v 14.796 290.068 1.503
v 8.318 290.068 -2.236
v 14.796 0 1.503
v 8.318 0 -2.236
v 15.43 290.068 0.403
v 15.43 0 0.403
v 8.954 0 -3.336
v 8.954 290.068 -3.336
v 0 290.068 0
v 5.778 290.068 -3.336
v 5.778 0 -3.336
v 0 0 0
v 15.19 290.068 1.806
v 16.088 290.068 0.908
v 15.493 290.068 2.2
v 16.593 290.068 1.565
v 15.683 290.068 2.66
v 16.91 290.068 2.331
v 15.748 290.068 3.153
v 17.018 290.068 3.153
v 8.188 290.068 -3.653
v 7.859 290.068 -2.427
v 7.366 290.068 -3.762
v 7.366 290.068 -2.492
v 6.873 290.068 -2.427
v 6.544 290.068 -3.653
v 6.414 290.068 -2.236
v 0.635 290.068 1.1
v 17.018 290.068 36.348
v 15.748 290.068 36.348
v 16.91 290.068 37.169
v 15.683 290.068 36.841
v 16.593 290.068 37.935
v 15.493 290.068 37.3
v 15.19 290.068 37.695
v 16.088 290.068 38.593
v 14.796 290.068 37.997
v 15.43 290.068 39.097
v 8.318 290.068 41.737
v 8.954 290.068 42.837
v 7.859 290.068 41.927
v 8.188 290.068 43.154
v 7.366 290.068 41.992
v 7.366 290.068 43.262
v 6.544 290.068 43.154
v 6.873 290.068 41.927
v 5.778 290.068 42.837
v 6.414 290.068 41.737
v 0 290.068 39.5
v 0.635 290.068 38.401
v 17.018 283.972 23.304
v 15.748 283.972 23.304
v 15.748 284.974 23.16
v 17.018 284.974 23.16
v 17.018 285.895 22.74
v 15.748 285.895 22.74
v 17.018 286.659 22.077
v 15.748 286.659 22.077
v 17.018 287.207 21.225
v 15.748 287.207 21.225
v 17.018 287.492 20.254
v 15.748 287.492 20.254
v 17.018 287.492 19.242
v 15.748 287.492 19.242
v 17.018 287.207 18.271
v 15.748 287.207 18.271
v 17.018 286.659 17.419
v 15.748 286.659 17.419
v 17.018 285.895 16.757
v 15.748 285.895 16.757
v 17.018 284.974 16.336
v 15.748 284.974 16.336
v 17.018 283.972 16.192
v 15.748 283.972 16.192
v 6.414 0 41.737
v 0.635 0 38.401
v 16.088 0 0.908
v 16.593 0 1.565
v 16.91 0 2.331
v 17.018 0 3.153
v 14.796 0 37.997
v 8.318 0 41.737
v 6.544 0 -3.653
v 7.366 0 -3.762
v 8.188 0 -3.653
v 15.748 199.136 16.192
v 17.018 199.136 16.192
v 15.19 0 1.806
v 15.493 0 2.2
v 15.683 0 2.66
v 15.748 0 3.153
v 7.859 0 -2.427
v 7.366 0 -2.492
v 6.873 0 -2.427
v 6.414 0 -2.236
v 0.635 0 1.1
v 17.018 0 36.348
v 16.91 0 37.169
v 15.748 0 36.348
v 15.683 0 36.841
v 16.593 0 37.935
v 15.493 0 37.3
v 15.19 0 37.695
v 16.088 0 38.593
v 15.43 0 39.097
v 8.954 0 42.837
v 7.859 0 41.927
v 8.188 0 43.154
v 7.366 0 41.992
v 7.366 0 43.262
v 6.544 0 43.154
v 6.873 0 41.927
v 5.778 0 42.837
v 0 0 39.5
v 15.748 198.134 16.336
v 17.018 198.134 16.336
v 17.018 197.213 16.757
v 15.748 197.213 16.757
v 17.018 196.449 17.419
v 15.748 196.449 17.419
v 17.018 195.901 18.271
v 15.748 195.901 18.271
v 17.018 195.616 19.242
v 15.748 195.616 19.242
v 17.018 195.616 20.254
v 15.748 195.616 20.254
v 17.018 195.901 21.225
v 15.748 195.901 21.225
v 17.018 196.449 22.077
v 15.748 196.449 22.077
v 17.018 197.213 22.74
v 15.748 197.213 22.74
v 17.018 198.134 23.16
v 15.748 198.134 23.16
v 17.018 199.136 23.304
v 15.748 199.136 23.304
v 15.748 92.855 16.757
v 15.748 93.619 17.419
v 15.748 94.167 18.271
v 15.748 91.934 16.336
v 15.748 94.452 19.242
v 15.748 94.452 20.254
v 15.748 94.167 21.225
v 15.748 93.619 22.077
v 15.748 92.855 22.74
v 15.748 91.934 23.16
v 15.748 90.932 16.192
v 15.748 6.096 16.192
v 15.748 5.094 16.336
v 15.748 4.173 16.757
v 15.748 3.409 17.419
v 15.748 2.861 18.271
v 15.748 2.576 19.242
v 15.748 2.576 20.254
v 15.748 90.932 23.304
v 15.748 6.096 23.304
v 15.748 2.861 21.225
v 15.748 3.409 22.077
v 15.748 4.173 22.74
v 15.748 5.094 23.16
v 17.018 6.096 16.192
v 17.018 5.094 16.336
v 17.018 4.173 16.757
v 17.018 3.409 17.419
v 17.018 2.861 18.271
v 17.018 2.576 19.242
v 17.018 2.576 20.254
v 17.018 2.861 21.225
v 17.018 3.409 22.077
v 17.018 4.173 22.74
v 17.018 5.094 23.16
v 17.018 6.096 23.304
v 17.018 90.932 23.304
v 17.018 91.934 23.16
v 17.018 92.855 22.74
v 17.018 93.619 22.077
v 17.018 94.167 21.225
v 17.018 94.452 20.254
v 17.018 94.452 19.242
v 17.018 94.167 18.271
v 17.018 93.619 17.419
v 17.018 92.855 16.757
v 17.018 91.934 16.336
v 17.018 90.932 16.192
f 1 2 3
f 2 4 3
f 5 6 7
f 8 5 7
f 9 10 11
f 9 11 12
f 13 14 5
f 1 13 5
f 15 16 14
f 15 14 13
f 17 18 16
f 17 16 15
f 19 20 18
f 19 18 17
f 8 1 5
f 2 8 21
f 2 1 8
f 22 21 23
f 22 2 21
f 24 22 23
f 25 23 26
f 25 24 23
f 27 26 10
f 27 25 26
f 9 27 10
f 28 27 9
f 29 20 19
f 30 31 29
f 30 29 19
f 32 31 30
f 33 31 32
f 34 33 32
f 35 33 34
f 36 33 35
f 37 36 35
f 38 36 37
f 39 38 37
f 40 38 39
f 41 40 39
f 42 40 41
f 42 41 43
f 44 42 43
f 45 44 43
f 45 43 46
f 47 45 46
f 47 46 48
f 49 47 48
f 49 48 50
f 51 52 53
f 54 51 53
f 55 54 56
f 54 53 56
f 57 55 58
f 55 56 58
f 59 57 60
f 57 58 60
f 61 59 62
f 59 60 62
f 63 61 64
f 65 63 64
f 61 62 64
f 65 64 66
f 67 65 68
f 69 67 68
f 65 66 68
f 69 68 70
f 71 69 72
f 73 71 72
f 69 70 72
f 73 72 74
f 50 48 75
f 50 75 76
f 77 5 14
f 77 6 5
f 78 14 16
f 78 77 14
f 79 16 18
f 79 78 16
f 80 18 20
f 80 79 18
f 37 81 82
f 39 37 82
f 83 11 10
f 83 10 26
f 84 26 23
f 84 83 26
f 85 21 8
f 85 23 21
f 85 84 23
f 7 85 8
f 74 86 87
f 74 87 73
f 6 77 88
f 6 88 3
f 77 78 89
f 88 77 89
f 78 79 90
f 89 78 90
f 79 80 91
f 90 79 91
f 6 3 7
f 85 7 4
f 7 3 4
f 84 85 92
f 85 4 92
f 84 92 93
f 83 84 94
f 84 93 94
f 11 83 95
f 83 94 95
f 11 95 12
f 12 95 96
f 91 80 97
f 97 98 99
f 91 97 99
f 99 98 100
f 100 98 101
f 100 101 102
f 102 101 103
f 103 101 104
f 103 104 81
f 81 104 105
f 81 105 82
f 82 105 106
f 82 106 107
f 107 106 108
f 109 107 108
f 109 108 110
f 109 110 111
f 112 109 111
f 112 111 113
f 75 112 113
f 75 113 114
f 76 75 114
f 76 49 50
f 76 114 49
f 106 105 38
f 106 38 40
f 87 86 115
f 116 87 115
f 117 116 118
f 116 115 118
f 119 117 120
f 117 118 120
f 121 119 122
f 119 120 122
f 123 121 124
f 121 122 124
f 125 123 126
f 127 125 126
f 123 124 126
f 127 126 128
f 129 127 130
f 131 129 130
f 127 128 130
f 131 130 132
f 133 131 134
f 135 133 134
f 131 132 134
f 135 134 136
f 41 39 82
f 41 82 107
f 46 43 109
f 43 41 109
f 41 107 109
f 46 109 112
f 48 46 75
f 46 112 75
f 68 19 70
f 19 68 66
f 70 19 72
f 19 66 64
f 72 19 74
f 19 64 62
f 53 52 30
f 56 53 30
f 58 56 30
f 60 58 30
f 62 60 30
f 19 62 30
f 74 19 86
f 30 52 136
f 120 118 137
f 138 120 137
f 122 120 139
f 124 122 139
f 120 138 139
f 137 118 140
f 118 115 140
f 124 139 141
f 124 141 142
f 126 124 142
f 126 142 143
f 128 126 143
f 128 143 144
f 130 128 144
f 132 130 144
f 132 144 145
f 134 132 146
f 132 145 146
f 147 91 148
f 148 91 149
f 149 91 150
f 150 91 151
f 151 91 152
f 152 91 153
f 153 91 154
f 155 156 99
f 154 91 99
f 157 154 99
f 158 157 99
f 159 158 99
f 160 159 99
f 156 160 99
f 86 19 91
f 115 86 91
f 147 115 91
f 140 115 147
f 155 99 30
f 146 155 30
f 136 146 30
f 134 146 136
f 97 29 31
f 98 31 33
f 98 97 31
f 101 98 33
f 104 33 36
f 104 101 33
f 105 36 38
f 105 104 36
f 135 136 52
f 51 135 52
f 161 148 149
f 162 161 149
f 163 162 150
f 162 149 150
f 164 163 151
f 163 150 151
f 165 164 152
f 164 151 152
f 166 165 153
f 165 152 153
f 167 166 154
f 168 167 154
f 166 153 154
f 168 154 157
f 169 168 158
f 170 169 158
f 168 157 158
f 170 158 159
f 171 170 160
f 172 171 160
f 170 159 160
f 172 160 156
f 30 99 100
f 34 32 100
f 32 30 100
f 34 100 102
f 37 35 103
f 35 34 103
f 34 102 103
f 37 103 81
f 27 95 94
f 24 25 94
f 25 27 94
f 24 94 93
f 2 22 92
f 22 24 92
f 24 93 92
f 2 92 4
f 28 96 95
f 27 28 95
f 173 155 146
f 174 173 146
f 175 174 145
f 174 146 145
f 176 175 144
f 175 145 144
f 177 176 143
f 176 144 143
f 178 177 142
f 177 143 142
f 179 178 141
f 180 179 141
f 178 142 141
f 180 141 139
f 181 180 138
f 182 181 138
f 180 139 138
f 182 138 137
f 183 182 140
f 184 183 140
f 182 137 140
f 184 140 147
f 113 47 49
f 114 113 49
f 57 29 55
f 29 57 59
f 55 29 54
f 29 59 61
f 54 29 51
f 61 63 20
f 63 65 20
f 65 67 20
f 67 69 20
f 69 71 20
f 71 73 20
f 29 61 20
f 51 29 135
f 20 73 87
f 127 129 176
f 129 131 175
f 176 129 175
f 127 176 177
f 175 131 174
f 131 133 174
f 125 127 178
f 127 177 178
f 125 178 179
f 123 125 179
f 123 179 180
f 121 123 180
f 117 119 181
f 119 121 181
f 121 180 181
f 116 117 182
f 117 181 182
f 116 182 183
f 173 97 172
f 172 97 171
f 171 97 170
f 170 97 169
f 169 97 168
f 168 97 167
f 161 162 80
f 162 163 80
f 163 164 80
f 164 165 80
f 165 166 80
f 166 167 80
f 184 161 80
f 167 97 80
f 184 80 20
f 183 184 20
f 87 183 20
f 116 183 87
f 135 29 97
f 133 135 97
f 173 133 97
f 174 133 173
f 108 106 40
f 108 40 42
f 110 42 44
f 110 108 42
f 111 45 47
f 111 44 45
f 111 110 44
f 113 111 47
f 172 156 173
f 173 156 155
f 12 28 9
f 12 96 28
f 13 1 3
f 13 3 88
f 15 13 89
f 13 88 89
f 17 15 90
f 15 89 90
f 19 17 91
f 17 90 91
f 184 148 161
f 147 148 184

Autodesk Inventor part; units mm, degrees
ref_plane "YZ Plane" through (0, 0, 0) normal (1, 0, 0) x (0, 1, 0)
ref_plane "XZ Plane" through (0, 0, 0) normal (0, 1, 0) x (-1, 0, 0)
ref_plane "XY Plane" through (0, 0, 0) normal (0, 0, 1) x (1, 0, 0)
sketch "Sketch1" plane through (0, 0, 0) normal (0, 1, 0) x (-1, 0, 0)
  line L0 (-17.018, 36.3476) -> (-17.018, 3.1529)
  line L1 (-15.4305, 0.4033) -> (-8.9535, -3.3362)
  line L2 (-5.7785, -3.3362) -> (0, 0)
  line L3 (-15.4305, 39.0972) -> (-8.9535, 42.8367)
  line L4 (-5.7785, 42.8367) -> (0, 39.5005)
  arc A0 (-15.4305, 39.0972) -> (-17.018, 36.3476) centre (-13.843, 36.3476) ccw
  arc A1 (-5.7785, 42.8367) -> (-8.9535, 42.8367) centre (-7.366, 40.0871) ccw
  arc A2 (-8.9535, -3.3362) -> (-5.7785, -3.3362) centre (-7.366, -0.5866) ccw
  arc A3 (-17.018, 3.1529) -> (-15.4305, 0.4033) centre (-13.843, 3.1529) ccw
  line L5 (-0.635, 1.0999) -> (-6.4135, -2.2364)
  arc A4 (-8.3185, -2.2364) -> (-6.4135, -2.2364) centre (-7.366, -0.5866) ccw
  line L6 (-8.3185, -2.2364) -> (-14.7955, 1.5031)
  arc A5 (-15.748, 3.1529) -> (-14.7955, 1.5031) centre (-13.843, 3.1529) ccw
  line L7 (-15.748, 3.1529) -> (-15.748, 36.3476)
  arc A6 (-14.7955, 37.9973) -> (-15.748, 36.3476) centre (-13.843, 36.3476) ccw
  line L8 (-14.7955, 37.9973) -> (-8.3185, 41.7368)
  arc A7 (-6.4135, 41.7368) -> (-8.3185, 41.7368) centre (-7.366, 40.0871) ccw
  line L9 (-6.4135, 41.7368) -> (-0.635, 38.4006)
  line L10 (0, 39.5005) -> (-0.635, 38.4006)
  line L11 (-0.635, 1.0999) -> (0, 0)
  point P0 (-17.018, 38.1807)
  point P1 (-17.018, 1.3198)
  point P2 (-7.366, -4.2528)
  point P3 (-7.366, 43.7532)
  dimension "d2" = 48.006
  dimension "d3" = 17.018
  dimension "d4" = 17.018
  dimension "d5" = 120
  dimension "d6" = 120
  dimension "d7" = 120
  dimension "d8" = 120
  dimension "d9" = 9.652
  dimension "d10" = 9.652
  dimension "d11" = 3.175
  dimension "d12" = 1.27
extrude "Extrusion1" add sketch "Sketch1" along normal blind 290.068
sketch "Sketch2" plane through (15.748, 0, 3.1529) normal (-1, 0, 0) x (0, 0, 1)
  line L0 (13.0392, 6.096) -> (13.0392, 90.932)
  line L1 (20.1512, 6.096) -> (20.1512, 90.932)
  arc A0 (20.1512, 90.932) -> (13.0392, 90.932) centre (16.5952, 90.932) ccw
  arc A1 (13.0392, 6.096) -> (20.1512, 6.096) centre (16.5952, 6.096) ccw
  line L2 (13.0392, 199.136) -> (13.0392, 283.972)
  line L3 (20.1512, 199.136) -> (20.1512, 283.972)
  arc A2 (20.1512, 283.972) -> (13.0392, 283.972) centre (16.5952, 283.972) ccw
  arc A3 (13.0392, 199.136) -> (20.1512, 199.136) centre (16.5952, 199.136) ccw
  line L4 (0, 0) -> (33.1947, 0) projected
  line L5 (39.6838, 0) -> (39.6838, 290.068) projected
  point P0 (-3.1529, 0)
  point P1 (16.5952, 94.488)
  point P2 (16.5952, 2.54)
  point P3 (16.5952, 94.488)
  point P4 (16.5952, 195.58)
  point P5 (16.5952, 287.528)
  dimension "d16" = 101.092
  dimension "d17" = 91.948
  dimension "d18" = 91.948
  dimension "d19" = 2.54
  dimension "d20" = 23.0886
  dimension "d21" = 23.0886
  dimension "d22" = 7.112
  dimension "d23" = 7.112
extrude "Extrusion2" cut sketch "Sketch2" against normal through all
properties part number "PoleBracket"
